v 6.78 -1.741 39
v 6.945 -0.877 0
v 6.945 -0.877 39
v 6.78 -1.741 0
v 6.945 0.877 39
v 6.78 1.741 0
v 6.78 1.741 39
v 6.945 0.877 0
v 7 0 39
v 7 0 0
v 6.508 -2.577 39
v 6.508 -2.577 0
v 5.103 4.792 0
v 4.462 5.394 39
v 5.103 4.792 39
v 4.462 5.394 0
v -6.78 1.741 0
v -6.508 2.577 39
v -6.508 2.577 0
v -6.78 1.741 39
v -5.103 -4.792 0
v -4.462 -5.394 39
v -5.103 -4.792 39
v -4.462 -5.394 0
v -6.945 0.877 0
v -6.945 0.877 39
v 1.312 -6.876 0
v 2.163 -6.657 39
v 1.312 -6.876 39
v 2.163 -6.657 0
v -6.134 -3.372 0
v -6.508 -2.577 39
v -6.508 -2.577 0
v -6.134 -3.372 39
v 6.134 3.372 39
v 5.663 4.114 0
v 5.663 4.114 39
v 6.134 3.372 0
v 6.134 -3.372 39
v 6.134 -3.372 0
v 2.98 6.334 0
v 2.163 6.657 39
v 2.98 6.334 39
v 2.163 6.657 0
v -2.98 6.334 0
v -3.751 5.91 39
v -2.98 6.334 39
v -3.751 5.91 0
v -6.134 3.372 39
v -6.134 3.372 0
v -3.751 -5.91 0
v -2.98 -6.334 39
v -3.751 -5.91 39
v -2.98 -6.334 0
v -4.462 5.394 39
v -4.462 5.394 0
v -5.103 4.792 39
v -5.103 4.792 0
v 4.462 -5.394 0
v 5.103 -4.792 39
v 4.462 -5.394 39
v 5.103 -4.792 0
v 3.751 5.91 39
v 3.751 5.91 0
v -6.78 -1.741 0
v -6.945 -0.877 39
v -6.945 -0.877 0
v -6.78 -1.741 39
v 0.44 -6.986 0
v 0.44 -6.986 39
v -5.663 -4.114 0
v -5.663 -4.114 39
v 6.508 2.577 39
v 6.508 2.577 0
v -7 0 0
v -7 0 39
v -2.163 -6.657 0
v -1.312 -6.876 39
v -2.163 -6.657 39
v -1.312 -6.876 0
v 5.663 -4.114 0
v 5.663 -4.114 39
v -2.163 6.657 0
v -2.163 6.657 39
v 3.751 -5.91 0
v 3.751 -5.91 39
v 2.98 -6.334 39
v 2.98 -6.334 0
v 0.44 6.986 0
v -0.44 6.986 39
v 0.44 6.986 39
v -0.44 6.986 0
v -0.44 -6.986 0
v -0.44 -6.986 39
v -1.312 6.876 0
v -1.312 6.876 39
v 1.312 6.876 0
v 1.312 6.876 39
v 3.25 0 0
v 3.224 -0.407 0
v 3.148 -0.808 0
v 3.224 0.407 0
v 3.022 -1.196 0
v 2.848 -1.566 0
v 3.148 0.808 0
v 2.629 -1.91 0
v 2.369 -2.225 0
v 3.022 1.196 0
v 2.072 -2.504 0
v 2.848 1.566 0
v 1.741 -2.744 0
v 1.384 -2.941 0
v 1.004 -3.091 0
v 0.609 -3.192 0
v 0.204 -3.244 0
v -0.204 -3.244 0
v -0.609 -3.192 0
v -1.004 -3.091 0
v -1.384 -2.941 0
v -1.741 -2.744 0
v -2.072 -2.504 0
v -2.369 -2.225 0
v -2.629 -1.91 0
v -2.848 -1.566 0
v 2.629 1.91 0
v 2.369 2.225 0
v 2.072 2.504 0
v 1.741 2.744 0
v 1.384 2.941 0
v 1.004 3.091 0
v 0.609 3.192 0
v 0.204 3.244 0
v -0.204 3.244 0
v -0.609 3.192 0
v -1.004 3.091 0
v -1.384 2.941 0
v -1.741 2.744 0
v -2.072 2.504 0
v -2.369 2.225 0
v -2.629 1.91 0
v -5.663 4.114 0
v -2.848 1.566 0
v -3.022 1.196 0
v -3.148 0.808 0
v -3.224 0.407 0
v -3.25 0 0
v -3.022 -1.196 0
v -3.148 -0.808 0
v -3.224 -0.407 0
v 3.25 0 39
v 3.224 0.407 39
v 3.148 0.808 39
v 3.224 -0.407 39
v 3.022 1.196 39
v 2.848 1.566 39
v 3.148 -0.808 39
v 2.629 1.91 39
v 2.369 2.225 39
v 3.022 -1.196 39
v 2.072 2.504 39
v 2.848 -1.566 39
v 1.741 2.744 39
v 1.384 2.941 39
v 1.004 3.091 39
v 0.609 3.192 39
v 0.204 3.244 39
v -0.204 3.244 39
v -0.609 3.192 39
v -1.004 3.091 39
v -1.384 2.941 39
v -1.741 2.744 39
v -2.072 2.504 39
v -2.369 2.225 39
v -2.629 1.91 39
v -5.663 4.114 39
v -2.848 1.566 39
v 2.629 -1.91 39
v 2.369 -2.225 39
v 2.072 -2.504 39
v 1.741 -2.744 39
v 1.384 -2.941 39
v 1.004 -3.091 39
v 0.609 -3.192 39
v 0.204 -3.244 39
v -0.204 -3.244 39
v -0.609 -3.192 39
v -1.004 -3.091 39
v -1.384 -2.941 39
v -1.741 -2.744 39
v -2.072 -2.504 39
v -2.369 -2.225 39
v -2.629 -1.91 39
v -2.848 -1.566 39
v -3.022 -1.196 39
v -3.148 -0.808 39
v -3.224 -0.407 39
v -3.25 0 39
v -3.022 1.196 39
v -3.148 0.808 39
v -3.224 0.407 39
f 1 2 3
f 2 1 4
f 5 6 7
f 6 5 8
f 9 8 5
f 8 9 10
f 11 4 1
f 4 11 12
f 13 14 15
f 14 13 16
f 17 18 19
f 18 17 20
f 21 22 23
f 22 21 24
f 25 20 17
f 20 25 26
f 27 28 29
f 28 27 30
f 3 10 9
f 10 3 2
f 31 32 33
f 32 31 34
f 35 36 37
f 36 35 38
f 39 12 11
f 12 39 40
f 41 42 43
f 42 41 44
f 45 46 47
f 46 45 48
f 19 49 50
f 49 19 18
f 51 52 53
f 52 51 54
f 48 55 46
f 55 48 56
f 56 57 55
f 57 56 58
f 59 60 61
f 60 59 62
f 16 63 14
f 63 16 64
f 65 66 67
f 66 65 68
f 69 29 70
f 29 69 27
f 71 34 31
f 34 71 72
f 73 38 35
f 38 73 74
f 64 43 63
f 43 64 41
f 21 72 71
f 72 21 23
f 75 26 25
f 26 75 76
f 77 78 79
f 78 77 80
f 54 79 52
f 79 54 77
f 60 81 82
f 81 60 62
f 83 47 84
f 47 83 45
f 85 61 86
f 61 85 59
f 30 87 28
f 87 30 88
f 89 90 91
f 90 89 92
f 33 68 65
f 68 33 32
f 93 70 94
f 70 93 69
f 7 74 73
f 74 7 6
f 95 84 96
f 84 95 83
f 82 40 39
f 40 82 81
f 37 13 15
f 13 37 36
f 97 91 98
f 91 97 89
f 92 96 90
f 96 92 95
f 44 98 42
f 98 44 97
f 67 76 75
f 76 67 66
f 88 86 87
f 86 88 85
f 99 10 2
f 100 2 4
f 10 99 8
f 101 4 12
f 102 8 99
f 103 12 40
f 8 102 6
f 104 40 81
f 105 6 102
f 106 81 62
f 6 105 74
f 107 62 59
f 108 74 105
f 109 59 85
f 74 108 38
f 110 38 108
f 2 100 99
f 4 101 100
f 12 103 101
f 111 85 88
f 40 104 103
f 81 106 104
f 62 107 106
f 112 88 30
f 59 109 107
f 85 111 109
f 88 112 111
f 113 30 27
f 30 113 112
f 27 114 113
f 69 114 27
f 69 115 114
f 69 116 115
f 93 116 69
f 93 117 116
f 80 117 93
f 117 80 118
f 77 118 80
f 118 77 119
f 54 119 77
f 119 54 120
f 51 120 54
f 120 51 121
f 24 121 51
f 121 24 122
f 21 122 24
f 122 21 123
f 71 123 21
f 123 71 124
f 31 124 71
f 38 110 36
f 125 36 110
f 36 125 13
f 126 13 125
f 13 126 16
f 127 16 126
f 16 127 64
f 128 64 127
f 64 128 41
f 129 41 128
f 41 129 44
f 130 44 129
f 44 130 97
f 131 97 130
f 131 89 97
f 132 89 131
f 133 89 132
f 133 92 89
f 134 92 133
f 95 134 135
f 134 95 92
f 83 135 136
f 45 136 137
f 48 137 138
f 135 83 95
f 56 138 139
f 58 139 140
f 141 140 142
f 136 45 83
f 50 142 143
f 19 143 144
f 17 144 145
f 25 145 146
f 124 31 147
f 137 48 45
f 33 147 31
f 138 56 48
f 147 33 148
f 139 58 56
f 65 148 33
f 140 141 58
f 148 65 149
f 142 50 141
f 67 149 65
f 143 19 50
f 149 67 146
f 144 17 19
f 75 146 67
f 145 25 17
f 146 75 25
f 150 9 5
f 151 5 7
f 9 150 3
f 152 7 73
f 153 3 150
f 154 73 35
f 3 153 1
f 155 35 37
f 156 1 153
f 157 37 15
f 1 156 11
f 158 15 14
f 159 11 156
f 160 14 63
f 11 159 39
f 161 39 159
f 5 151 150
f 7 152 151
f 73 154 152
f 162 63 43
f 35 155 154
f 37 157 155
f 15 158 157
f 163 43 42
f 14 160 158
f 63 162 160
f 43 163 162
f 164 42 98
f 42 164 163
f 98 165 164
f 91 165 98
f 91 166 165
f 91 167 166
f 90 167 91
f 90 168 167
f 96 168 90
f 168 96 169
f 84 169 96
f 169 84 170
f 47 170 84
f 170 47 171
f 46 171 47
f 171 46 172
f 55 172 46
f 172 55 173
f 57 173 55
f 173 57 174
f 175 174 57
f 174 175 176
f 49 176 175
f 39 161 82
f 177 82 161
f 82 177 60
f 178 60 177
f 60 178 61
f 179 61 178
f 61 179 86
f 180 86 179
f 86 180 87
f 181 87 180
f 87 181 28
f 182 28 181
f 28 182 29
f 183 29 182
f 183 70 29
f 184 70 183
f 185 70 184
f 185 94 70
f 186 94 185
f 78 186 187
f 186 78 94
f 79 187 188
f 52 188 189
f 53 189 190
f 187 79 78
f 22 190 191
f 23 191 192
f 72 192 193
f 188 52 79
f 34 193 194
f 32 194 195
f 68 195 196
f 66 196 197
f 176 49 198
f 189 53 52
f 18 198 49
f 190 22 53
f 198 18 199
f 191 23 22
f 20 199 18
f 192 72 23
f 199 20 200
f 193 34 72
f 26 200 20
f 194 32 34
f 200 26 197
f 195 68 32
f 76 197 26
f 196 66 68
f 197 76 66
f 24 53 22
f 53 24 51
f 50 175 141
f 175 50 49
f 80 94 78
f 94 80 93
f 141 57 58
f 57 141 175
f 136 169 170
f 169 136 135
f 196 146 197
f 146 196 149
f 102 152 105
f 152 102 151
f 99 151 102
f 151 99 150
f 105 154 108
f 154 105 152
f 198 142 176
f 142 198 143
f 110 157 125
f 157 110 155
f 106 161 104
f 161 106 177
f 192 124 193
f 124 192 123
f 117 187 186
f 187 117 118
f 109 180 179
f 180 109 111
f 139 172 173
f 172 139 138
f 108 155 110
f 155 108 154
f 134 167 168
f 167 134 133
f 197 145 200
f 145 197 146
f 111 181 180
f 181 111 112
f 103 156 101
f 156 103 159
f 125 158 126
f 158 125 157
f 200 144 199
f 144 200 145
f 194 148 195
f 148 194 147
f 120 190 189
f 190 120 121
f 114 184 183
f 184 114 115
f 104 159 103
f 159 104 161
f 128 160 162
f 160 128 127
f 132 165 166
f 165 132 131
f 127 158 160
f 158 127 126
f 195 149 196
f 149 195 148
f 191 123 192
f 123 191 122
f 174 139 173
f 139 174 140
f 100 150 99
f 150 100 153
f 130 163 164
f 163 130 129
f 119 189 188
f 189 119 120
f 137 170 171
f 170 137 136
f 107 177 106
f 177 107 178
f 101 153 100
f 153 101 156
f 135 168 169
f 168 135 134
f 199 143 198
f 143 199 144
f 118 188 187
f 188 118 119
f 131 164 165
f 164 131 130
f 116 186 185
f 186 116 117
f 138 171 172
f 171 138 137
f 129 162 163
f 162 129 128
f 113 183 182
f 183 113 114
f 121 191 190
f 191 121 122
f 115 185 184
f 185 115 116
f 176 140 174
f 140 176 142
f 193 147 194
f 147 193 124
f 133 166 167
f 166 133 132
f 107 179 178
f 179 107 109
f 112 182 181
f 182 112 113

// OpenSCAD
$fn = 50;


difference() {
	union() {
		cylinder(h = 39, r = 7.0000000000);
	}
	union() {
		translate(v = [0, 0, -100]) {
			cylinder(h = 200, r = 3.2500000000);
		}
	}
}
